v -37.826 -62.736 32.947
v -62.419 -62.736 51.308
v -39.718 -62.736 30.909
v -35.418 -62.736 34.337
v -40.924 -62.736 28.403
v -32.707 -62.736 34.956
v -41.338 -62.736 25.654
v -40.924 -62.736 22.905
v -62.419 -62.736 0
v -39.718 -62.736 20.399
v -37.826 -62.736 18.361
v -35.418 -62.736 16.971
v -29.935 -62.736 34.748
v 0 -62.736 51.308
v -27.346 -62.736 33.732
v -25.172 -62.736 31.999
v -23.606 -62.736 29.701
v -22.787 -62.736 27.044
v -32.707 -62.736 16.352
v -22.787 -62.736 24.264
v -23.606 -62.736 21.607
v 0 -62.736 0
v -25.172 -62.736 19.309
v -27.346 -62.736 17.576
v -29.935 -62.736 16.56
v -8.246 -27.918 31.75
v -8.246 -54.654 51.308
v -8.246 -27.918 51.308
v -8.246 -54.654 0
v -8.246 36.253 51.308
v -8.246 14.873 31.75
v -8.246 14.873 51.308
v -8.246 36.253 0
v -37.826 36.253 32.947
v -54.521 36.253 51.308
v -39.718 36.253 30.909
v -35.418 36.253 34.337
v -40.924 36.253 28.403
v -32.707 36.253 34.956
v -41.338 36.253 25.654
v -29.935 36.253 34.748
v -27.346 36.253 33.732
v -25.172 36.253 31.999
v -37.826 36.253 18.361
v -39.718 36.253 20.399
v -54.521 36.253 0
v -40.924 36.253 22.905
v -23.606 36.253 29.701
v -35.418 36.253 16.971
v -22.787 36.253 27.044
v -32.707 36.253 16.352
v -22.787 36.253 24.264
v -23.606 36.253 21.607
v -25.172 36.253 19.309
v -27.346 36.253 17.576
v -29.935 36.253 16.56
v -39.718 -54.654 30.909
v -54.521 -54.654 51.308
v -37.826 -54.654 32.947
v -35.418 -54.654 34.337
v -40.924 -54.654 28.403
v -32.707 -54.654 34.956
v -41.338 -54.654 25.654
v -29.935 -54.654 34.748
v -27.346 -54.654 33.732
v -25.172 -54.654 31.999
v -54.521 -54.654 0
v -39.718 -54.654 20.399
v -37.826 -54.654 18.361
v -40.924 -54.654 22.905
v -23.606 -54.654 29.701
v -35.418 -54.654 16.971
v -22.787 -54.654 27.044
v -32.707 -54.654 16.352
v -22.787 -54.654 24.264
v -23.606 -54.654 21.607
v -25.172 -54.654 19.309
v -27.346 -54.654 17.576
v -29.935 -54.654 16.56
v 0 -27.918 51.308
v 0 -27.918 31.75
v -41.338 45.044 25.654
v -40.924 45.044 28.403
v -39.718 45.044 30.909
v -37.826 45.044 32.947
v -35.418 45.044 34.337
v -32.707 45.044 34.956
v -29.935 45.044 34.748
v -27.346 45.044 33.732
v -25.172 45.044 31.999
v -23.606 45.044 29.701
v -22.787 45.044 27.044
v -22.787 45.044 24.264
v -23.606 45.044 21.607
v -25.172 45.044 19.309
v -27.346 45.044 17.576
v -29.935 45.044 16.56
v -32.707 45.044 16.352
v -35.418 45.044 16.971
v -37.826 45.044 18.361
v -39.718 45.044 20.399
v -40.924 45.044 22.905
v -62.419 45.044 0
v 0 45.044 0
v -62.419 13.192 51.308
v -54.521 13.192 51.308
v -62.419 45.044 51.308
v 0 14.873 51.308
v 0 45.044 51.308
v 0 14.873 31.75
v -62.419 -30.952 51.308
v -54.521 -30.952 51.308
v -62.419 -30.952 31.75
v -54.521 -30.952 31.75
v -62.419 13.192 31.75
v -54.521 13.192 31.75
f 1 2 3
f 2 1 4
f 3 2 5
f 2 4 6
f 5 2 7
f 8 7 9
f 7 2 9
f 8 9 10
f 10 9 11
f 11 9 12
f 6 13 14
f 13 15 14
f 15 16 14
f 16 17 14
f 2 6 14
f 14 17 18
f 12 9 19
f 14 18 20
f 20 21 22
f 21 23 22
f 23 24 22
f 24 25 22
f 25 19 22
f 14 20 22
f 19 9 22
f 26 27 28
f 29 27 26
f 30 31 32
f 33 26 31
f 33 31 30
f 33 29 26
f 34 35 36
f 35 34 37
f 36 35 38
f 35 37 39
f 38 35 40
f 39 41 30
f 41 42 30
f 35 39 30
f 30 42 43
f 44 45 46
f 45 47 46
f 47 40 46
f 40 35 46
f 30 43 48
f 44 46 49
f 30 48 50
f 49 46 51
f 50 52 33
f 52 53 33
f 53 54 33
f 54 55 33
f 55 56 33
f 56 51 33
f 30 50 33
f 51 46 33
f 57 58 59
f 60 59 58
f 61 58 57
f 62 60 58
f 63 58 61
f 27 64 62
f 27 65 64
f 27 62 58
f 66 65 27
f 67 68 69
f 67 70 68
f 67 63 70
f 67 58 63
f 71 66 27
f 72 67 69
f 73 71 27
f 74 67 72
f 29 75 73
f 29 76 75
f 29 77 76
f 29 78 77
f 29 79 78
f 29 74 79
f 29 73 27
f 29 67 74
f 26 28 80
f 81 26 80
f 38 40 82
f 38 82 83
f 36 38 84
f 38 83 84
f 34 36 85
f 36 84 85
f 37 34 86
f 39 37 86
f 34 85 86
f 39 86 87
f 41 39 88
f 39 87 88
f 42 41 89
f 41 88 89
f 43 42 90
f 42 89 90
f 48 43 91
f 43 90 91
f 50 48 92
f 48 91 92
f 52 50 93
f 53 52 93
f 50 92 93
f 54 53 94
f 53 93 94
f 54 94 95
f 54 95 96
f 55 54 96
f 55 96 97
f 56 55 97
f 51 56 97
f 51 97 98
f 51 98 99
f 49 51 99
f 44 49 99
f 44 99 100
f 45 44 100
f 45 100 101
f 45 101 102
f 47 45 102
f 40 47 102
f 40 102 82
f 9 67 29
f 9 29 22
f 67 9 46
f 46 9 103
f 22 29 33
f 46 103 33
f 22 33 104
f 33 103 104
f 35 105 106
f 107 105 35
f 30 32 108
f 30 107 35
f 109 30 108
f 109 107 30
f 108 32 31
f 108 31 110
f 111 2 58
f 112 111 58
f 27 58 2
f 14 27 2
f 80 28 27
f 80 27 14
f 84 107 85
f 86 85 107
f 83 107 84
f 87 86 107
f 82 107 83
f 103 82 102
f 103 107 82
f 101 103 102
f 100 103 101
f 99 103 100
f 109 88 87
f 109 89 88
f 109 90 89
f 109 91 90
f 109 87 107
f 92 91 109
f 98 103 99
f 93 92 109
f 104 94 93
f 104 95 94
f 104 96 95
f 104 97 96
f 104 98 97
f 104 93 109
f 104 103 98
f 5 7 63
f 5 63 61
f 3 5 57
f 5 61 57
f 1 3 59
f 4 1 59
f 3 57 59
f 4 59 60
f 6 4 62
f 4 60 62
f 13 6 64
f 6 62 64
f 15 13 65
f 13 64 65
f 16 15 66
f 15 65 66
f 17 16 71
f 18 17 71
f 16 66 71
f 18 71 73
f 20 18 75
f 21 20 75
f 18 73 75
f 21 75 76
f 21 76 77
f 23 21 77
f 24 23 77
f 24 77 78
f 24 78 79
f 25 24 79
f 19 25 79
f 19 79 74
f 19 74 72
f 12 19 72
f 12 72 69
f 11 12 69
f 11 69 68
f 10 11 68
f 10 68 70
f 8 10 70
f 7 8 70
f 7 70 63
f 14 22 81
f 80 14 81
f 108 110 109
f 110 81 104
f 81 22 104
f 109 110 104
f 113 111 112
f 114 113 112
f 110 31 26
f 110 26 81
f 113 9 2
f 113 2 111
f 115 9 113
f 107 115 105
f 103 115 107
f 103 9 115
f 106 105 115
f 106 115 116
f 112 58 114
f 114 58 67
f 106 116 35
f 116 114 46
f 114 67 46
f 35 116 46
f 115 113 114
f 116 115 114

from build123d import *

# Parameters (mm, degrees)
F0_W     = 62.4194853008
F0_H     = 107.7802851796
F0_W_2   = 46.2748277932
F0_H_2   = 90.9063592553
F1_DEPTH = 51.308
F2_W     = 8.2461107522
F2_H     = 42.7914112806
F2_W_2   = 7.8985467553
F2_H_2   = 44.1445242614
F3_DEPTH = 19.558
F4_R     = 9.3280185705
F5_DEPTH = 152.4


with BuildPart() as f1:
    # F0 (on Top) → F1 (new body)
    with BuildSketch(Plane.XY):
        with Locations((-31.2097426504, -8.8457427919)):
            Rectangle(F0_W, F0_H)
        with Locations((-31.3835246488, -9.2003643513)):
            Rectangle(F0_W_2, F0_H_2, mode=Mode.SUBTRACT)
    extrude(amount=F1_DEPTH)

    # F2 (on face) → F3 (cut)
    with BuildSketch(Plane.XY.offset(51.308)):
        with Locations((-4.1230553761, -6.5223816782)):
            Rectangle(F2_W, F2_H)
        with Locations((-58.4702119231, -8.8798655197)):
            Rectangle(F2_W_2, F2_H_2)
    extrude(amount=-F3_DEPTH, mode=Mode.SUBTRACT)

    # F4 (on face) → F5 (cut)
    with BuildSketch(Plane(origin=(0, 45.0443997979, 0), x_dir=(-1, 0, 0), z_dir=(0, 1, 0))):
        with Locations((32.0103727281, 25.654)):
            Circle(F4_R)
    extrude(amount=-F5_DEPTH, mode=Mode.SUBTRACT)


solid = f1.part
